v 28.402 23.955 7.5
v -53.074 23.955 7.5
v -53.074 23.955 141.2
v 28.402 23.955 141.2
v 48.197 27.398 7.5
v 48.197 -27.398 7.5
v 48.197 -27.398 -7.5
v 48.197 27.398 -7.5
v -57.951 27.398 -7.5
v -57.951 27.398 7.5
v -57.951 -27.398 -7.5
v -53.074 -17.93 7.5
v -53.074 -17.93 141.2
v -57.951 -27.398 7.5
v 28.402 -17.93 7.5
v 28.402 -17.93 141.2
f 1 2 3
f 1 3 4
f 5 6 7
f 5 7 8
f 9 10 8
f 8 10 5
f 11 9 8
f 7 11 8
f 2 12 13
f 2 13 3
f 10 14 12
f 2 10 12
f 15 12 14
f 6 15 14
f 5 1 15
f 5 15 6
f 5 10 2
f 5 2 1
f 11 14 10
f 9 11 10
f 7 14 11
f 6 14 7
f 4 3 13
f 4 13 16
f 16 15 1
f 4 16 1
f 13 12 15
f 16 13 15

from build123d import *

# Parameters (mm, degrees)
F0_W     = 106.147542
F0_H     = 54.795082
F1_DEPTH = 7.5
F2_W     = 81.475418
F2_H     = 41.885248
F3_DEPTH = 133.7


with BuildPart() as f1:
    # F0 (on Top) → F1 (new body, symmetric)
    with BuildSketch(Plane.XY):
        with Locations((-4.877049, 0)):
            Rectangle(F0_W, F0_H)
    extrude(amount=F1_DEPTH, both=True)

    # F2 (on face) → F3 (join)
    with BuildSketch(Plane.XY.offset(7.5)):
        with Locations((-12.336066, 3.012295)):
            Rectangle(F2_W, F2_H)
    extrude(amount=F3_DEPTH)


solid = f1.part
